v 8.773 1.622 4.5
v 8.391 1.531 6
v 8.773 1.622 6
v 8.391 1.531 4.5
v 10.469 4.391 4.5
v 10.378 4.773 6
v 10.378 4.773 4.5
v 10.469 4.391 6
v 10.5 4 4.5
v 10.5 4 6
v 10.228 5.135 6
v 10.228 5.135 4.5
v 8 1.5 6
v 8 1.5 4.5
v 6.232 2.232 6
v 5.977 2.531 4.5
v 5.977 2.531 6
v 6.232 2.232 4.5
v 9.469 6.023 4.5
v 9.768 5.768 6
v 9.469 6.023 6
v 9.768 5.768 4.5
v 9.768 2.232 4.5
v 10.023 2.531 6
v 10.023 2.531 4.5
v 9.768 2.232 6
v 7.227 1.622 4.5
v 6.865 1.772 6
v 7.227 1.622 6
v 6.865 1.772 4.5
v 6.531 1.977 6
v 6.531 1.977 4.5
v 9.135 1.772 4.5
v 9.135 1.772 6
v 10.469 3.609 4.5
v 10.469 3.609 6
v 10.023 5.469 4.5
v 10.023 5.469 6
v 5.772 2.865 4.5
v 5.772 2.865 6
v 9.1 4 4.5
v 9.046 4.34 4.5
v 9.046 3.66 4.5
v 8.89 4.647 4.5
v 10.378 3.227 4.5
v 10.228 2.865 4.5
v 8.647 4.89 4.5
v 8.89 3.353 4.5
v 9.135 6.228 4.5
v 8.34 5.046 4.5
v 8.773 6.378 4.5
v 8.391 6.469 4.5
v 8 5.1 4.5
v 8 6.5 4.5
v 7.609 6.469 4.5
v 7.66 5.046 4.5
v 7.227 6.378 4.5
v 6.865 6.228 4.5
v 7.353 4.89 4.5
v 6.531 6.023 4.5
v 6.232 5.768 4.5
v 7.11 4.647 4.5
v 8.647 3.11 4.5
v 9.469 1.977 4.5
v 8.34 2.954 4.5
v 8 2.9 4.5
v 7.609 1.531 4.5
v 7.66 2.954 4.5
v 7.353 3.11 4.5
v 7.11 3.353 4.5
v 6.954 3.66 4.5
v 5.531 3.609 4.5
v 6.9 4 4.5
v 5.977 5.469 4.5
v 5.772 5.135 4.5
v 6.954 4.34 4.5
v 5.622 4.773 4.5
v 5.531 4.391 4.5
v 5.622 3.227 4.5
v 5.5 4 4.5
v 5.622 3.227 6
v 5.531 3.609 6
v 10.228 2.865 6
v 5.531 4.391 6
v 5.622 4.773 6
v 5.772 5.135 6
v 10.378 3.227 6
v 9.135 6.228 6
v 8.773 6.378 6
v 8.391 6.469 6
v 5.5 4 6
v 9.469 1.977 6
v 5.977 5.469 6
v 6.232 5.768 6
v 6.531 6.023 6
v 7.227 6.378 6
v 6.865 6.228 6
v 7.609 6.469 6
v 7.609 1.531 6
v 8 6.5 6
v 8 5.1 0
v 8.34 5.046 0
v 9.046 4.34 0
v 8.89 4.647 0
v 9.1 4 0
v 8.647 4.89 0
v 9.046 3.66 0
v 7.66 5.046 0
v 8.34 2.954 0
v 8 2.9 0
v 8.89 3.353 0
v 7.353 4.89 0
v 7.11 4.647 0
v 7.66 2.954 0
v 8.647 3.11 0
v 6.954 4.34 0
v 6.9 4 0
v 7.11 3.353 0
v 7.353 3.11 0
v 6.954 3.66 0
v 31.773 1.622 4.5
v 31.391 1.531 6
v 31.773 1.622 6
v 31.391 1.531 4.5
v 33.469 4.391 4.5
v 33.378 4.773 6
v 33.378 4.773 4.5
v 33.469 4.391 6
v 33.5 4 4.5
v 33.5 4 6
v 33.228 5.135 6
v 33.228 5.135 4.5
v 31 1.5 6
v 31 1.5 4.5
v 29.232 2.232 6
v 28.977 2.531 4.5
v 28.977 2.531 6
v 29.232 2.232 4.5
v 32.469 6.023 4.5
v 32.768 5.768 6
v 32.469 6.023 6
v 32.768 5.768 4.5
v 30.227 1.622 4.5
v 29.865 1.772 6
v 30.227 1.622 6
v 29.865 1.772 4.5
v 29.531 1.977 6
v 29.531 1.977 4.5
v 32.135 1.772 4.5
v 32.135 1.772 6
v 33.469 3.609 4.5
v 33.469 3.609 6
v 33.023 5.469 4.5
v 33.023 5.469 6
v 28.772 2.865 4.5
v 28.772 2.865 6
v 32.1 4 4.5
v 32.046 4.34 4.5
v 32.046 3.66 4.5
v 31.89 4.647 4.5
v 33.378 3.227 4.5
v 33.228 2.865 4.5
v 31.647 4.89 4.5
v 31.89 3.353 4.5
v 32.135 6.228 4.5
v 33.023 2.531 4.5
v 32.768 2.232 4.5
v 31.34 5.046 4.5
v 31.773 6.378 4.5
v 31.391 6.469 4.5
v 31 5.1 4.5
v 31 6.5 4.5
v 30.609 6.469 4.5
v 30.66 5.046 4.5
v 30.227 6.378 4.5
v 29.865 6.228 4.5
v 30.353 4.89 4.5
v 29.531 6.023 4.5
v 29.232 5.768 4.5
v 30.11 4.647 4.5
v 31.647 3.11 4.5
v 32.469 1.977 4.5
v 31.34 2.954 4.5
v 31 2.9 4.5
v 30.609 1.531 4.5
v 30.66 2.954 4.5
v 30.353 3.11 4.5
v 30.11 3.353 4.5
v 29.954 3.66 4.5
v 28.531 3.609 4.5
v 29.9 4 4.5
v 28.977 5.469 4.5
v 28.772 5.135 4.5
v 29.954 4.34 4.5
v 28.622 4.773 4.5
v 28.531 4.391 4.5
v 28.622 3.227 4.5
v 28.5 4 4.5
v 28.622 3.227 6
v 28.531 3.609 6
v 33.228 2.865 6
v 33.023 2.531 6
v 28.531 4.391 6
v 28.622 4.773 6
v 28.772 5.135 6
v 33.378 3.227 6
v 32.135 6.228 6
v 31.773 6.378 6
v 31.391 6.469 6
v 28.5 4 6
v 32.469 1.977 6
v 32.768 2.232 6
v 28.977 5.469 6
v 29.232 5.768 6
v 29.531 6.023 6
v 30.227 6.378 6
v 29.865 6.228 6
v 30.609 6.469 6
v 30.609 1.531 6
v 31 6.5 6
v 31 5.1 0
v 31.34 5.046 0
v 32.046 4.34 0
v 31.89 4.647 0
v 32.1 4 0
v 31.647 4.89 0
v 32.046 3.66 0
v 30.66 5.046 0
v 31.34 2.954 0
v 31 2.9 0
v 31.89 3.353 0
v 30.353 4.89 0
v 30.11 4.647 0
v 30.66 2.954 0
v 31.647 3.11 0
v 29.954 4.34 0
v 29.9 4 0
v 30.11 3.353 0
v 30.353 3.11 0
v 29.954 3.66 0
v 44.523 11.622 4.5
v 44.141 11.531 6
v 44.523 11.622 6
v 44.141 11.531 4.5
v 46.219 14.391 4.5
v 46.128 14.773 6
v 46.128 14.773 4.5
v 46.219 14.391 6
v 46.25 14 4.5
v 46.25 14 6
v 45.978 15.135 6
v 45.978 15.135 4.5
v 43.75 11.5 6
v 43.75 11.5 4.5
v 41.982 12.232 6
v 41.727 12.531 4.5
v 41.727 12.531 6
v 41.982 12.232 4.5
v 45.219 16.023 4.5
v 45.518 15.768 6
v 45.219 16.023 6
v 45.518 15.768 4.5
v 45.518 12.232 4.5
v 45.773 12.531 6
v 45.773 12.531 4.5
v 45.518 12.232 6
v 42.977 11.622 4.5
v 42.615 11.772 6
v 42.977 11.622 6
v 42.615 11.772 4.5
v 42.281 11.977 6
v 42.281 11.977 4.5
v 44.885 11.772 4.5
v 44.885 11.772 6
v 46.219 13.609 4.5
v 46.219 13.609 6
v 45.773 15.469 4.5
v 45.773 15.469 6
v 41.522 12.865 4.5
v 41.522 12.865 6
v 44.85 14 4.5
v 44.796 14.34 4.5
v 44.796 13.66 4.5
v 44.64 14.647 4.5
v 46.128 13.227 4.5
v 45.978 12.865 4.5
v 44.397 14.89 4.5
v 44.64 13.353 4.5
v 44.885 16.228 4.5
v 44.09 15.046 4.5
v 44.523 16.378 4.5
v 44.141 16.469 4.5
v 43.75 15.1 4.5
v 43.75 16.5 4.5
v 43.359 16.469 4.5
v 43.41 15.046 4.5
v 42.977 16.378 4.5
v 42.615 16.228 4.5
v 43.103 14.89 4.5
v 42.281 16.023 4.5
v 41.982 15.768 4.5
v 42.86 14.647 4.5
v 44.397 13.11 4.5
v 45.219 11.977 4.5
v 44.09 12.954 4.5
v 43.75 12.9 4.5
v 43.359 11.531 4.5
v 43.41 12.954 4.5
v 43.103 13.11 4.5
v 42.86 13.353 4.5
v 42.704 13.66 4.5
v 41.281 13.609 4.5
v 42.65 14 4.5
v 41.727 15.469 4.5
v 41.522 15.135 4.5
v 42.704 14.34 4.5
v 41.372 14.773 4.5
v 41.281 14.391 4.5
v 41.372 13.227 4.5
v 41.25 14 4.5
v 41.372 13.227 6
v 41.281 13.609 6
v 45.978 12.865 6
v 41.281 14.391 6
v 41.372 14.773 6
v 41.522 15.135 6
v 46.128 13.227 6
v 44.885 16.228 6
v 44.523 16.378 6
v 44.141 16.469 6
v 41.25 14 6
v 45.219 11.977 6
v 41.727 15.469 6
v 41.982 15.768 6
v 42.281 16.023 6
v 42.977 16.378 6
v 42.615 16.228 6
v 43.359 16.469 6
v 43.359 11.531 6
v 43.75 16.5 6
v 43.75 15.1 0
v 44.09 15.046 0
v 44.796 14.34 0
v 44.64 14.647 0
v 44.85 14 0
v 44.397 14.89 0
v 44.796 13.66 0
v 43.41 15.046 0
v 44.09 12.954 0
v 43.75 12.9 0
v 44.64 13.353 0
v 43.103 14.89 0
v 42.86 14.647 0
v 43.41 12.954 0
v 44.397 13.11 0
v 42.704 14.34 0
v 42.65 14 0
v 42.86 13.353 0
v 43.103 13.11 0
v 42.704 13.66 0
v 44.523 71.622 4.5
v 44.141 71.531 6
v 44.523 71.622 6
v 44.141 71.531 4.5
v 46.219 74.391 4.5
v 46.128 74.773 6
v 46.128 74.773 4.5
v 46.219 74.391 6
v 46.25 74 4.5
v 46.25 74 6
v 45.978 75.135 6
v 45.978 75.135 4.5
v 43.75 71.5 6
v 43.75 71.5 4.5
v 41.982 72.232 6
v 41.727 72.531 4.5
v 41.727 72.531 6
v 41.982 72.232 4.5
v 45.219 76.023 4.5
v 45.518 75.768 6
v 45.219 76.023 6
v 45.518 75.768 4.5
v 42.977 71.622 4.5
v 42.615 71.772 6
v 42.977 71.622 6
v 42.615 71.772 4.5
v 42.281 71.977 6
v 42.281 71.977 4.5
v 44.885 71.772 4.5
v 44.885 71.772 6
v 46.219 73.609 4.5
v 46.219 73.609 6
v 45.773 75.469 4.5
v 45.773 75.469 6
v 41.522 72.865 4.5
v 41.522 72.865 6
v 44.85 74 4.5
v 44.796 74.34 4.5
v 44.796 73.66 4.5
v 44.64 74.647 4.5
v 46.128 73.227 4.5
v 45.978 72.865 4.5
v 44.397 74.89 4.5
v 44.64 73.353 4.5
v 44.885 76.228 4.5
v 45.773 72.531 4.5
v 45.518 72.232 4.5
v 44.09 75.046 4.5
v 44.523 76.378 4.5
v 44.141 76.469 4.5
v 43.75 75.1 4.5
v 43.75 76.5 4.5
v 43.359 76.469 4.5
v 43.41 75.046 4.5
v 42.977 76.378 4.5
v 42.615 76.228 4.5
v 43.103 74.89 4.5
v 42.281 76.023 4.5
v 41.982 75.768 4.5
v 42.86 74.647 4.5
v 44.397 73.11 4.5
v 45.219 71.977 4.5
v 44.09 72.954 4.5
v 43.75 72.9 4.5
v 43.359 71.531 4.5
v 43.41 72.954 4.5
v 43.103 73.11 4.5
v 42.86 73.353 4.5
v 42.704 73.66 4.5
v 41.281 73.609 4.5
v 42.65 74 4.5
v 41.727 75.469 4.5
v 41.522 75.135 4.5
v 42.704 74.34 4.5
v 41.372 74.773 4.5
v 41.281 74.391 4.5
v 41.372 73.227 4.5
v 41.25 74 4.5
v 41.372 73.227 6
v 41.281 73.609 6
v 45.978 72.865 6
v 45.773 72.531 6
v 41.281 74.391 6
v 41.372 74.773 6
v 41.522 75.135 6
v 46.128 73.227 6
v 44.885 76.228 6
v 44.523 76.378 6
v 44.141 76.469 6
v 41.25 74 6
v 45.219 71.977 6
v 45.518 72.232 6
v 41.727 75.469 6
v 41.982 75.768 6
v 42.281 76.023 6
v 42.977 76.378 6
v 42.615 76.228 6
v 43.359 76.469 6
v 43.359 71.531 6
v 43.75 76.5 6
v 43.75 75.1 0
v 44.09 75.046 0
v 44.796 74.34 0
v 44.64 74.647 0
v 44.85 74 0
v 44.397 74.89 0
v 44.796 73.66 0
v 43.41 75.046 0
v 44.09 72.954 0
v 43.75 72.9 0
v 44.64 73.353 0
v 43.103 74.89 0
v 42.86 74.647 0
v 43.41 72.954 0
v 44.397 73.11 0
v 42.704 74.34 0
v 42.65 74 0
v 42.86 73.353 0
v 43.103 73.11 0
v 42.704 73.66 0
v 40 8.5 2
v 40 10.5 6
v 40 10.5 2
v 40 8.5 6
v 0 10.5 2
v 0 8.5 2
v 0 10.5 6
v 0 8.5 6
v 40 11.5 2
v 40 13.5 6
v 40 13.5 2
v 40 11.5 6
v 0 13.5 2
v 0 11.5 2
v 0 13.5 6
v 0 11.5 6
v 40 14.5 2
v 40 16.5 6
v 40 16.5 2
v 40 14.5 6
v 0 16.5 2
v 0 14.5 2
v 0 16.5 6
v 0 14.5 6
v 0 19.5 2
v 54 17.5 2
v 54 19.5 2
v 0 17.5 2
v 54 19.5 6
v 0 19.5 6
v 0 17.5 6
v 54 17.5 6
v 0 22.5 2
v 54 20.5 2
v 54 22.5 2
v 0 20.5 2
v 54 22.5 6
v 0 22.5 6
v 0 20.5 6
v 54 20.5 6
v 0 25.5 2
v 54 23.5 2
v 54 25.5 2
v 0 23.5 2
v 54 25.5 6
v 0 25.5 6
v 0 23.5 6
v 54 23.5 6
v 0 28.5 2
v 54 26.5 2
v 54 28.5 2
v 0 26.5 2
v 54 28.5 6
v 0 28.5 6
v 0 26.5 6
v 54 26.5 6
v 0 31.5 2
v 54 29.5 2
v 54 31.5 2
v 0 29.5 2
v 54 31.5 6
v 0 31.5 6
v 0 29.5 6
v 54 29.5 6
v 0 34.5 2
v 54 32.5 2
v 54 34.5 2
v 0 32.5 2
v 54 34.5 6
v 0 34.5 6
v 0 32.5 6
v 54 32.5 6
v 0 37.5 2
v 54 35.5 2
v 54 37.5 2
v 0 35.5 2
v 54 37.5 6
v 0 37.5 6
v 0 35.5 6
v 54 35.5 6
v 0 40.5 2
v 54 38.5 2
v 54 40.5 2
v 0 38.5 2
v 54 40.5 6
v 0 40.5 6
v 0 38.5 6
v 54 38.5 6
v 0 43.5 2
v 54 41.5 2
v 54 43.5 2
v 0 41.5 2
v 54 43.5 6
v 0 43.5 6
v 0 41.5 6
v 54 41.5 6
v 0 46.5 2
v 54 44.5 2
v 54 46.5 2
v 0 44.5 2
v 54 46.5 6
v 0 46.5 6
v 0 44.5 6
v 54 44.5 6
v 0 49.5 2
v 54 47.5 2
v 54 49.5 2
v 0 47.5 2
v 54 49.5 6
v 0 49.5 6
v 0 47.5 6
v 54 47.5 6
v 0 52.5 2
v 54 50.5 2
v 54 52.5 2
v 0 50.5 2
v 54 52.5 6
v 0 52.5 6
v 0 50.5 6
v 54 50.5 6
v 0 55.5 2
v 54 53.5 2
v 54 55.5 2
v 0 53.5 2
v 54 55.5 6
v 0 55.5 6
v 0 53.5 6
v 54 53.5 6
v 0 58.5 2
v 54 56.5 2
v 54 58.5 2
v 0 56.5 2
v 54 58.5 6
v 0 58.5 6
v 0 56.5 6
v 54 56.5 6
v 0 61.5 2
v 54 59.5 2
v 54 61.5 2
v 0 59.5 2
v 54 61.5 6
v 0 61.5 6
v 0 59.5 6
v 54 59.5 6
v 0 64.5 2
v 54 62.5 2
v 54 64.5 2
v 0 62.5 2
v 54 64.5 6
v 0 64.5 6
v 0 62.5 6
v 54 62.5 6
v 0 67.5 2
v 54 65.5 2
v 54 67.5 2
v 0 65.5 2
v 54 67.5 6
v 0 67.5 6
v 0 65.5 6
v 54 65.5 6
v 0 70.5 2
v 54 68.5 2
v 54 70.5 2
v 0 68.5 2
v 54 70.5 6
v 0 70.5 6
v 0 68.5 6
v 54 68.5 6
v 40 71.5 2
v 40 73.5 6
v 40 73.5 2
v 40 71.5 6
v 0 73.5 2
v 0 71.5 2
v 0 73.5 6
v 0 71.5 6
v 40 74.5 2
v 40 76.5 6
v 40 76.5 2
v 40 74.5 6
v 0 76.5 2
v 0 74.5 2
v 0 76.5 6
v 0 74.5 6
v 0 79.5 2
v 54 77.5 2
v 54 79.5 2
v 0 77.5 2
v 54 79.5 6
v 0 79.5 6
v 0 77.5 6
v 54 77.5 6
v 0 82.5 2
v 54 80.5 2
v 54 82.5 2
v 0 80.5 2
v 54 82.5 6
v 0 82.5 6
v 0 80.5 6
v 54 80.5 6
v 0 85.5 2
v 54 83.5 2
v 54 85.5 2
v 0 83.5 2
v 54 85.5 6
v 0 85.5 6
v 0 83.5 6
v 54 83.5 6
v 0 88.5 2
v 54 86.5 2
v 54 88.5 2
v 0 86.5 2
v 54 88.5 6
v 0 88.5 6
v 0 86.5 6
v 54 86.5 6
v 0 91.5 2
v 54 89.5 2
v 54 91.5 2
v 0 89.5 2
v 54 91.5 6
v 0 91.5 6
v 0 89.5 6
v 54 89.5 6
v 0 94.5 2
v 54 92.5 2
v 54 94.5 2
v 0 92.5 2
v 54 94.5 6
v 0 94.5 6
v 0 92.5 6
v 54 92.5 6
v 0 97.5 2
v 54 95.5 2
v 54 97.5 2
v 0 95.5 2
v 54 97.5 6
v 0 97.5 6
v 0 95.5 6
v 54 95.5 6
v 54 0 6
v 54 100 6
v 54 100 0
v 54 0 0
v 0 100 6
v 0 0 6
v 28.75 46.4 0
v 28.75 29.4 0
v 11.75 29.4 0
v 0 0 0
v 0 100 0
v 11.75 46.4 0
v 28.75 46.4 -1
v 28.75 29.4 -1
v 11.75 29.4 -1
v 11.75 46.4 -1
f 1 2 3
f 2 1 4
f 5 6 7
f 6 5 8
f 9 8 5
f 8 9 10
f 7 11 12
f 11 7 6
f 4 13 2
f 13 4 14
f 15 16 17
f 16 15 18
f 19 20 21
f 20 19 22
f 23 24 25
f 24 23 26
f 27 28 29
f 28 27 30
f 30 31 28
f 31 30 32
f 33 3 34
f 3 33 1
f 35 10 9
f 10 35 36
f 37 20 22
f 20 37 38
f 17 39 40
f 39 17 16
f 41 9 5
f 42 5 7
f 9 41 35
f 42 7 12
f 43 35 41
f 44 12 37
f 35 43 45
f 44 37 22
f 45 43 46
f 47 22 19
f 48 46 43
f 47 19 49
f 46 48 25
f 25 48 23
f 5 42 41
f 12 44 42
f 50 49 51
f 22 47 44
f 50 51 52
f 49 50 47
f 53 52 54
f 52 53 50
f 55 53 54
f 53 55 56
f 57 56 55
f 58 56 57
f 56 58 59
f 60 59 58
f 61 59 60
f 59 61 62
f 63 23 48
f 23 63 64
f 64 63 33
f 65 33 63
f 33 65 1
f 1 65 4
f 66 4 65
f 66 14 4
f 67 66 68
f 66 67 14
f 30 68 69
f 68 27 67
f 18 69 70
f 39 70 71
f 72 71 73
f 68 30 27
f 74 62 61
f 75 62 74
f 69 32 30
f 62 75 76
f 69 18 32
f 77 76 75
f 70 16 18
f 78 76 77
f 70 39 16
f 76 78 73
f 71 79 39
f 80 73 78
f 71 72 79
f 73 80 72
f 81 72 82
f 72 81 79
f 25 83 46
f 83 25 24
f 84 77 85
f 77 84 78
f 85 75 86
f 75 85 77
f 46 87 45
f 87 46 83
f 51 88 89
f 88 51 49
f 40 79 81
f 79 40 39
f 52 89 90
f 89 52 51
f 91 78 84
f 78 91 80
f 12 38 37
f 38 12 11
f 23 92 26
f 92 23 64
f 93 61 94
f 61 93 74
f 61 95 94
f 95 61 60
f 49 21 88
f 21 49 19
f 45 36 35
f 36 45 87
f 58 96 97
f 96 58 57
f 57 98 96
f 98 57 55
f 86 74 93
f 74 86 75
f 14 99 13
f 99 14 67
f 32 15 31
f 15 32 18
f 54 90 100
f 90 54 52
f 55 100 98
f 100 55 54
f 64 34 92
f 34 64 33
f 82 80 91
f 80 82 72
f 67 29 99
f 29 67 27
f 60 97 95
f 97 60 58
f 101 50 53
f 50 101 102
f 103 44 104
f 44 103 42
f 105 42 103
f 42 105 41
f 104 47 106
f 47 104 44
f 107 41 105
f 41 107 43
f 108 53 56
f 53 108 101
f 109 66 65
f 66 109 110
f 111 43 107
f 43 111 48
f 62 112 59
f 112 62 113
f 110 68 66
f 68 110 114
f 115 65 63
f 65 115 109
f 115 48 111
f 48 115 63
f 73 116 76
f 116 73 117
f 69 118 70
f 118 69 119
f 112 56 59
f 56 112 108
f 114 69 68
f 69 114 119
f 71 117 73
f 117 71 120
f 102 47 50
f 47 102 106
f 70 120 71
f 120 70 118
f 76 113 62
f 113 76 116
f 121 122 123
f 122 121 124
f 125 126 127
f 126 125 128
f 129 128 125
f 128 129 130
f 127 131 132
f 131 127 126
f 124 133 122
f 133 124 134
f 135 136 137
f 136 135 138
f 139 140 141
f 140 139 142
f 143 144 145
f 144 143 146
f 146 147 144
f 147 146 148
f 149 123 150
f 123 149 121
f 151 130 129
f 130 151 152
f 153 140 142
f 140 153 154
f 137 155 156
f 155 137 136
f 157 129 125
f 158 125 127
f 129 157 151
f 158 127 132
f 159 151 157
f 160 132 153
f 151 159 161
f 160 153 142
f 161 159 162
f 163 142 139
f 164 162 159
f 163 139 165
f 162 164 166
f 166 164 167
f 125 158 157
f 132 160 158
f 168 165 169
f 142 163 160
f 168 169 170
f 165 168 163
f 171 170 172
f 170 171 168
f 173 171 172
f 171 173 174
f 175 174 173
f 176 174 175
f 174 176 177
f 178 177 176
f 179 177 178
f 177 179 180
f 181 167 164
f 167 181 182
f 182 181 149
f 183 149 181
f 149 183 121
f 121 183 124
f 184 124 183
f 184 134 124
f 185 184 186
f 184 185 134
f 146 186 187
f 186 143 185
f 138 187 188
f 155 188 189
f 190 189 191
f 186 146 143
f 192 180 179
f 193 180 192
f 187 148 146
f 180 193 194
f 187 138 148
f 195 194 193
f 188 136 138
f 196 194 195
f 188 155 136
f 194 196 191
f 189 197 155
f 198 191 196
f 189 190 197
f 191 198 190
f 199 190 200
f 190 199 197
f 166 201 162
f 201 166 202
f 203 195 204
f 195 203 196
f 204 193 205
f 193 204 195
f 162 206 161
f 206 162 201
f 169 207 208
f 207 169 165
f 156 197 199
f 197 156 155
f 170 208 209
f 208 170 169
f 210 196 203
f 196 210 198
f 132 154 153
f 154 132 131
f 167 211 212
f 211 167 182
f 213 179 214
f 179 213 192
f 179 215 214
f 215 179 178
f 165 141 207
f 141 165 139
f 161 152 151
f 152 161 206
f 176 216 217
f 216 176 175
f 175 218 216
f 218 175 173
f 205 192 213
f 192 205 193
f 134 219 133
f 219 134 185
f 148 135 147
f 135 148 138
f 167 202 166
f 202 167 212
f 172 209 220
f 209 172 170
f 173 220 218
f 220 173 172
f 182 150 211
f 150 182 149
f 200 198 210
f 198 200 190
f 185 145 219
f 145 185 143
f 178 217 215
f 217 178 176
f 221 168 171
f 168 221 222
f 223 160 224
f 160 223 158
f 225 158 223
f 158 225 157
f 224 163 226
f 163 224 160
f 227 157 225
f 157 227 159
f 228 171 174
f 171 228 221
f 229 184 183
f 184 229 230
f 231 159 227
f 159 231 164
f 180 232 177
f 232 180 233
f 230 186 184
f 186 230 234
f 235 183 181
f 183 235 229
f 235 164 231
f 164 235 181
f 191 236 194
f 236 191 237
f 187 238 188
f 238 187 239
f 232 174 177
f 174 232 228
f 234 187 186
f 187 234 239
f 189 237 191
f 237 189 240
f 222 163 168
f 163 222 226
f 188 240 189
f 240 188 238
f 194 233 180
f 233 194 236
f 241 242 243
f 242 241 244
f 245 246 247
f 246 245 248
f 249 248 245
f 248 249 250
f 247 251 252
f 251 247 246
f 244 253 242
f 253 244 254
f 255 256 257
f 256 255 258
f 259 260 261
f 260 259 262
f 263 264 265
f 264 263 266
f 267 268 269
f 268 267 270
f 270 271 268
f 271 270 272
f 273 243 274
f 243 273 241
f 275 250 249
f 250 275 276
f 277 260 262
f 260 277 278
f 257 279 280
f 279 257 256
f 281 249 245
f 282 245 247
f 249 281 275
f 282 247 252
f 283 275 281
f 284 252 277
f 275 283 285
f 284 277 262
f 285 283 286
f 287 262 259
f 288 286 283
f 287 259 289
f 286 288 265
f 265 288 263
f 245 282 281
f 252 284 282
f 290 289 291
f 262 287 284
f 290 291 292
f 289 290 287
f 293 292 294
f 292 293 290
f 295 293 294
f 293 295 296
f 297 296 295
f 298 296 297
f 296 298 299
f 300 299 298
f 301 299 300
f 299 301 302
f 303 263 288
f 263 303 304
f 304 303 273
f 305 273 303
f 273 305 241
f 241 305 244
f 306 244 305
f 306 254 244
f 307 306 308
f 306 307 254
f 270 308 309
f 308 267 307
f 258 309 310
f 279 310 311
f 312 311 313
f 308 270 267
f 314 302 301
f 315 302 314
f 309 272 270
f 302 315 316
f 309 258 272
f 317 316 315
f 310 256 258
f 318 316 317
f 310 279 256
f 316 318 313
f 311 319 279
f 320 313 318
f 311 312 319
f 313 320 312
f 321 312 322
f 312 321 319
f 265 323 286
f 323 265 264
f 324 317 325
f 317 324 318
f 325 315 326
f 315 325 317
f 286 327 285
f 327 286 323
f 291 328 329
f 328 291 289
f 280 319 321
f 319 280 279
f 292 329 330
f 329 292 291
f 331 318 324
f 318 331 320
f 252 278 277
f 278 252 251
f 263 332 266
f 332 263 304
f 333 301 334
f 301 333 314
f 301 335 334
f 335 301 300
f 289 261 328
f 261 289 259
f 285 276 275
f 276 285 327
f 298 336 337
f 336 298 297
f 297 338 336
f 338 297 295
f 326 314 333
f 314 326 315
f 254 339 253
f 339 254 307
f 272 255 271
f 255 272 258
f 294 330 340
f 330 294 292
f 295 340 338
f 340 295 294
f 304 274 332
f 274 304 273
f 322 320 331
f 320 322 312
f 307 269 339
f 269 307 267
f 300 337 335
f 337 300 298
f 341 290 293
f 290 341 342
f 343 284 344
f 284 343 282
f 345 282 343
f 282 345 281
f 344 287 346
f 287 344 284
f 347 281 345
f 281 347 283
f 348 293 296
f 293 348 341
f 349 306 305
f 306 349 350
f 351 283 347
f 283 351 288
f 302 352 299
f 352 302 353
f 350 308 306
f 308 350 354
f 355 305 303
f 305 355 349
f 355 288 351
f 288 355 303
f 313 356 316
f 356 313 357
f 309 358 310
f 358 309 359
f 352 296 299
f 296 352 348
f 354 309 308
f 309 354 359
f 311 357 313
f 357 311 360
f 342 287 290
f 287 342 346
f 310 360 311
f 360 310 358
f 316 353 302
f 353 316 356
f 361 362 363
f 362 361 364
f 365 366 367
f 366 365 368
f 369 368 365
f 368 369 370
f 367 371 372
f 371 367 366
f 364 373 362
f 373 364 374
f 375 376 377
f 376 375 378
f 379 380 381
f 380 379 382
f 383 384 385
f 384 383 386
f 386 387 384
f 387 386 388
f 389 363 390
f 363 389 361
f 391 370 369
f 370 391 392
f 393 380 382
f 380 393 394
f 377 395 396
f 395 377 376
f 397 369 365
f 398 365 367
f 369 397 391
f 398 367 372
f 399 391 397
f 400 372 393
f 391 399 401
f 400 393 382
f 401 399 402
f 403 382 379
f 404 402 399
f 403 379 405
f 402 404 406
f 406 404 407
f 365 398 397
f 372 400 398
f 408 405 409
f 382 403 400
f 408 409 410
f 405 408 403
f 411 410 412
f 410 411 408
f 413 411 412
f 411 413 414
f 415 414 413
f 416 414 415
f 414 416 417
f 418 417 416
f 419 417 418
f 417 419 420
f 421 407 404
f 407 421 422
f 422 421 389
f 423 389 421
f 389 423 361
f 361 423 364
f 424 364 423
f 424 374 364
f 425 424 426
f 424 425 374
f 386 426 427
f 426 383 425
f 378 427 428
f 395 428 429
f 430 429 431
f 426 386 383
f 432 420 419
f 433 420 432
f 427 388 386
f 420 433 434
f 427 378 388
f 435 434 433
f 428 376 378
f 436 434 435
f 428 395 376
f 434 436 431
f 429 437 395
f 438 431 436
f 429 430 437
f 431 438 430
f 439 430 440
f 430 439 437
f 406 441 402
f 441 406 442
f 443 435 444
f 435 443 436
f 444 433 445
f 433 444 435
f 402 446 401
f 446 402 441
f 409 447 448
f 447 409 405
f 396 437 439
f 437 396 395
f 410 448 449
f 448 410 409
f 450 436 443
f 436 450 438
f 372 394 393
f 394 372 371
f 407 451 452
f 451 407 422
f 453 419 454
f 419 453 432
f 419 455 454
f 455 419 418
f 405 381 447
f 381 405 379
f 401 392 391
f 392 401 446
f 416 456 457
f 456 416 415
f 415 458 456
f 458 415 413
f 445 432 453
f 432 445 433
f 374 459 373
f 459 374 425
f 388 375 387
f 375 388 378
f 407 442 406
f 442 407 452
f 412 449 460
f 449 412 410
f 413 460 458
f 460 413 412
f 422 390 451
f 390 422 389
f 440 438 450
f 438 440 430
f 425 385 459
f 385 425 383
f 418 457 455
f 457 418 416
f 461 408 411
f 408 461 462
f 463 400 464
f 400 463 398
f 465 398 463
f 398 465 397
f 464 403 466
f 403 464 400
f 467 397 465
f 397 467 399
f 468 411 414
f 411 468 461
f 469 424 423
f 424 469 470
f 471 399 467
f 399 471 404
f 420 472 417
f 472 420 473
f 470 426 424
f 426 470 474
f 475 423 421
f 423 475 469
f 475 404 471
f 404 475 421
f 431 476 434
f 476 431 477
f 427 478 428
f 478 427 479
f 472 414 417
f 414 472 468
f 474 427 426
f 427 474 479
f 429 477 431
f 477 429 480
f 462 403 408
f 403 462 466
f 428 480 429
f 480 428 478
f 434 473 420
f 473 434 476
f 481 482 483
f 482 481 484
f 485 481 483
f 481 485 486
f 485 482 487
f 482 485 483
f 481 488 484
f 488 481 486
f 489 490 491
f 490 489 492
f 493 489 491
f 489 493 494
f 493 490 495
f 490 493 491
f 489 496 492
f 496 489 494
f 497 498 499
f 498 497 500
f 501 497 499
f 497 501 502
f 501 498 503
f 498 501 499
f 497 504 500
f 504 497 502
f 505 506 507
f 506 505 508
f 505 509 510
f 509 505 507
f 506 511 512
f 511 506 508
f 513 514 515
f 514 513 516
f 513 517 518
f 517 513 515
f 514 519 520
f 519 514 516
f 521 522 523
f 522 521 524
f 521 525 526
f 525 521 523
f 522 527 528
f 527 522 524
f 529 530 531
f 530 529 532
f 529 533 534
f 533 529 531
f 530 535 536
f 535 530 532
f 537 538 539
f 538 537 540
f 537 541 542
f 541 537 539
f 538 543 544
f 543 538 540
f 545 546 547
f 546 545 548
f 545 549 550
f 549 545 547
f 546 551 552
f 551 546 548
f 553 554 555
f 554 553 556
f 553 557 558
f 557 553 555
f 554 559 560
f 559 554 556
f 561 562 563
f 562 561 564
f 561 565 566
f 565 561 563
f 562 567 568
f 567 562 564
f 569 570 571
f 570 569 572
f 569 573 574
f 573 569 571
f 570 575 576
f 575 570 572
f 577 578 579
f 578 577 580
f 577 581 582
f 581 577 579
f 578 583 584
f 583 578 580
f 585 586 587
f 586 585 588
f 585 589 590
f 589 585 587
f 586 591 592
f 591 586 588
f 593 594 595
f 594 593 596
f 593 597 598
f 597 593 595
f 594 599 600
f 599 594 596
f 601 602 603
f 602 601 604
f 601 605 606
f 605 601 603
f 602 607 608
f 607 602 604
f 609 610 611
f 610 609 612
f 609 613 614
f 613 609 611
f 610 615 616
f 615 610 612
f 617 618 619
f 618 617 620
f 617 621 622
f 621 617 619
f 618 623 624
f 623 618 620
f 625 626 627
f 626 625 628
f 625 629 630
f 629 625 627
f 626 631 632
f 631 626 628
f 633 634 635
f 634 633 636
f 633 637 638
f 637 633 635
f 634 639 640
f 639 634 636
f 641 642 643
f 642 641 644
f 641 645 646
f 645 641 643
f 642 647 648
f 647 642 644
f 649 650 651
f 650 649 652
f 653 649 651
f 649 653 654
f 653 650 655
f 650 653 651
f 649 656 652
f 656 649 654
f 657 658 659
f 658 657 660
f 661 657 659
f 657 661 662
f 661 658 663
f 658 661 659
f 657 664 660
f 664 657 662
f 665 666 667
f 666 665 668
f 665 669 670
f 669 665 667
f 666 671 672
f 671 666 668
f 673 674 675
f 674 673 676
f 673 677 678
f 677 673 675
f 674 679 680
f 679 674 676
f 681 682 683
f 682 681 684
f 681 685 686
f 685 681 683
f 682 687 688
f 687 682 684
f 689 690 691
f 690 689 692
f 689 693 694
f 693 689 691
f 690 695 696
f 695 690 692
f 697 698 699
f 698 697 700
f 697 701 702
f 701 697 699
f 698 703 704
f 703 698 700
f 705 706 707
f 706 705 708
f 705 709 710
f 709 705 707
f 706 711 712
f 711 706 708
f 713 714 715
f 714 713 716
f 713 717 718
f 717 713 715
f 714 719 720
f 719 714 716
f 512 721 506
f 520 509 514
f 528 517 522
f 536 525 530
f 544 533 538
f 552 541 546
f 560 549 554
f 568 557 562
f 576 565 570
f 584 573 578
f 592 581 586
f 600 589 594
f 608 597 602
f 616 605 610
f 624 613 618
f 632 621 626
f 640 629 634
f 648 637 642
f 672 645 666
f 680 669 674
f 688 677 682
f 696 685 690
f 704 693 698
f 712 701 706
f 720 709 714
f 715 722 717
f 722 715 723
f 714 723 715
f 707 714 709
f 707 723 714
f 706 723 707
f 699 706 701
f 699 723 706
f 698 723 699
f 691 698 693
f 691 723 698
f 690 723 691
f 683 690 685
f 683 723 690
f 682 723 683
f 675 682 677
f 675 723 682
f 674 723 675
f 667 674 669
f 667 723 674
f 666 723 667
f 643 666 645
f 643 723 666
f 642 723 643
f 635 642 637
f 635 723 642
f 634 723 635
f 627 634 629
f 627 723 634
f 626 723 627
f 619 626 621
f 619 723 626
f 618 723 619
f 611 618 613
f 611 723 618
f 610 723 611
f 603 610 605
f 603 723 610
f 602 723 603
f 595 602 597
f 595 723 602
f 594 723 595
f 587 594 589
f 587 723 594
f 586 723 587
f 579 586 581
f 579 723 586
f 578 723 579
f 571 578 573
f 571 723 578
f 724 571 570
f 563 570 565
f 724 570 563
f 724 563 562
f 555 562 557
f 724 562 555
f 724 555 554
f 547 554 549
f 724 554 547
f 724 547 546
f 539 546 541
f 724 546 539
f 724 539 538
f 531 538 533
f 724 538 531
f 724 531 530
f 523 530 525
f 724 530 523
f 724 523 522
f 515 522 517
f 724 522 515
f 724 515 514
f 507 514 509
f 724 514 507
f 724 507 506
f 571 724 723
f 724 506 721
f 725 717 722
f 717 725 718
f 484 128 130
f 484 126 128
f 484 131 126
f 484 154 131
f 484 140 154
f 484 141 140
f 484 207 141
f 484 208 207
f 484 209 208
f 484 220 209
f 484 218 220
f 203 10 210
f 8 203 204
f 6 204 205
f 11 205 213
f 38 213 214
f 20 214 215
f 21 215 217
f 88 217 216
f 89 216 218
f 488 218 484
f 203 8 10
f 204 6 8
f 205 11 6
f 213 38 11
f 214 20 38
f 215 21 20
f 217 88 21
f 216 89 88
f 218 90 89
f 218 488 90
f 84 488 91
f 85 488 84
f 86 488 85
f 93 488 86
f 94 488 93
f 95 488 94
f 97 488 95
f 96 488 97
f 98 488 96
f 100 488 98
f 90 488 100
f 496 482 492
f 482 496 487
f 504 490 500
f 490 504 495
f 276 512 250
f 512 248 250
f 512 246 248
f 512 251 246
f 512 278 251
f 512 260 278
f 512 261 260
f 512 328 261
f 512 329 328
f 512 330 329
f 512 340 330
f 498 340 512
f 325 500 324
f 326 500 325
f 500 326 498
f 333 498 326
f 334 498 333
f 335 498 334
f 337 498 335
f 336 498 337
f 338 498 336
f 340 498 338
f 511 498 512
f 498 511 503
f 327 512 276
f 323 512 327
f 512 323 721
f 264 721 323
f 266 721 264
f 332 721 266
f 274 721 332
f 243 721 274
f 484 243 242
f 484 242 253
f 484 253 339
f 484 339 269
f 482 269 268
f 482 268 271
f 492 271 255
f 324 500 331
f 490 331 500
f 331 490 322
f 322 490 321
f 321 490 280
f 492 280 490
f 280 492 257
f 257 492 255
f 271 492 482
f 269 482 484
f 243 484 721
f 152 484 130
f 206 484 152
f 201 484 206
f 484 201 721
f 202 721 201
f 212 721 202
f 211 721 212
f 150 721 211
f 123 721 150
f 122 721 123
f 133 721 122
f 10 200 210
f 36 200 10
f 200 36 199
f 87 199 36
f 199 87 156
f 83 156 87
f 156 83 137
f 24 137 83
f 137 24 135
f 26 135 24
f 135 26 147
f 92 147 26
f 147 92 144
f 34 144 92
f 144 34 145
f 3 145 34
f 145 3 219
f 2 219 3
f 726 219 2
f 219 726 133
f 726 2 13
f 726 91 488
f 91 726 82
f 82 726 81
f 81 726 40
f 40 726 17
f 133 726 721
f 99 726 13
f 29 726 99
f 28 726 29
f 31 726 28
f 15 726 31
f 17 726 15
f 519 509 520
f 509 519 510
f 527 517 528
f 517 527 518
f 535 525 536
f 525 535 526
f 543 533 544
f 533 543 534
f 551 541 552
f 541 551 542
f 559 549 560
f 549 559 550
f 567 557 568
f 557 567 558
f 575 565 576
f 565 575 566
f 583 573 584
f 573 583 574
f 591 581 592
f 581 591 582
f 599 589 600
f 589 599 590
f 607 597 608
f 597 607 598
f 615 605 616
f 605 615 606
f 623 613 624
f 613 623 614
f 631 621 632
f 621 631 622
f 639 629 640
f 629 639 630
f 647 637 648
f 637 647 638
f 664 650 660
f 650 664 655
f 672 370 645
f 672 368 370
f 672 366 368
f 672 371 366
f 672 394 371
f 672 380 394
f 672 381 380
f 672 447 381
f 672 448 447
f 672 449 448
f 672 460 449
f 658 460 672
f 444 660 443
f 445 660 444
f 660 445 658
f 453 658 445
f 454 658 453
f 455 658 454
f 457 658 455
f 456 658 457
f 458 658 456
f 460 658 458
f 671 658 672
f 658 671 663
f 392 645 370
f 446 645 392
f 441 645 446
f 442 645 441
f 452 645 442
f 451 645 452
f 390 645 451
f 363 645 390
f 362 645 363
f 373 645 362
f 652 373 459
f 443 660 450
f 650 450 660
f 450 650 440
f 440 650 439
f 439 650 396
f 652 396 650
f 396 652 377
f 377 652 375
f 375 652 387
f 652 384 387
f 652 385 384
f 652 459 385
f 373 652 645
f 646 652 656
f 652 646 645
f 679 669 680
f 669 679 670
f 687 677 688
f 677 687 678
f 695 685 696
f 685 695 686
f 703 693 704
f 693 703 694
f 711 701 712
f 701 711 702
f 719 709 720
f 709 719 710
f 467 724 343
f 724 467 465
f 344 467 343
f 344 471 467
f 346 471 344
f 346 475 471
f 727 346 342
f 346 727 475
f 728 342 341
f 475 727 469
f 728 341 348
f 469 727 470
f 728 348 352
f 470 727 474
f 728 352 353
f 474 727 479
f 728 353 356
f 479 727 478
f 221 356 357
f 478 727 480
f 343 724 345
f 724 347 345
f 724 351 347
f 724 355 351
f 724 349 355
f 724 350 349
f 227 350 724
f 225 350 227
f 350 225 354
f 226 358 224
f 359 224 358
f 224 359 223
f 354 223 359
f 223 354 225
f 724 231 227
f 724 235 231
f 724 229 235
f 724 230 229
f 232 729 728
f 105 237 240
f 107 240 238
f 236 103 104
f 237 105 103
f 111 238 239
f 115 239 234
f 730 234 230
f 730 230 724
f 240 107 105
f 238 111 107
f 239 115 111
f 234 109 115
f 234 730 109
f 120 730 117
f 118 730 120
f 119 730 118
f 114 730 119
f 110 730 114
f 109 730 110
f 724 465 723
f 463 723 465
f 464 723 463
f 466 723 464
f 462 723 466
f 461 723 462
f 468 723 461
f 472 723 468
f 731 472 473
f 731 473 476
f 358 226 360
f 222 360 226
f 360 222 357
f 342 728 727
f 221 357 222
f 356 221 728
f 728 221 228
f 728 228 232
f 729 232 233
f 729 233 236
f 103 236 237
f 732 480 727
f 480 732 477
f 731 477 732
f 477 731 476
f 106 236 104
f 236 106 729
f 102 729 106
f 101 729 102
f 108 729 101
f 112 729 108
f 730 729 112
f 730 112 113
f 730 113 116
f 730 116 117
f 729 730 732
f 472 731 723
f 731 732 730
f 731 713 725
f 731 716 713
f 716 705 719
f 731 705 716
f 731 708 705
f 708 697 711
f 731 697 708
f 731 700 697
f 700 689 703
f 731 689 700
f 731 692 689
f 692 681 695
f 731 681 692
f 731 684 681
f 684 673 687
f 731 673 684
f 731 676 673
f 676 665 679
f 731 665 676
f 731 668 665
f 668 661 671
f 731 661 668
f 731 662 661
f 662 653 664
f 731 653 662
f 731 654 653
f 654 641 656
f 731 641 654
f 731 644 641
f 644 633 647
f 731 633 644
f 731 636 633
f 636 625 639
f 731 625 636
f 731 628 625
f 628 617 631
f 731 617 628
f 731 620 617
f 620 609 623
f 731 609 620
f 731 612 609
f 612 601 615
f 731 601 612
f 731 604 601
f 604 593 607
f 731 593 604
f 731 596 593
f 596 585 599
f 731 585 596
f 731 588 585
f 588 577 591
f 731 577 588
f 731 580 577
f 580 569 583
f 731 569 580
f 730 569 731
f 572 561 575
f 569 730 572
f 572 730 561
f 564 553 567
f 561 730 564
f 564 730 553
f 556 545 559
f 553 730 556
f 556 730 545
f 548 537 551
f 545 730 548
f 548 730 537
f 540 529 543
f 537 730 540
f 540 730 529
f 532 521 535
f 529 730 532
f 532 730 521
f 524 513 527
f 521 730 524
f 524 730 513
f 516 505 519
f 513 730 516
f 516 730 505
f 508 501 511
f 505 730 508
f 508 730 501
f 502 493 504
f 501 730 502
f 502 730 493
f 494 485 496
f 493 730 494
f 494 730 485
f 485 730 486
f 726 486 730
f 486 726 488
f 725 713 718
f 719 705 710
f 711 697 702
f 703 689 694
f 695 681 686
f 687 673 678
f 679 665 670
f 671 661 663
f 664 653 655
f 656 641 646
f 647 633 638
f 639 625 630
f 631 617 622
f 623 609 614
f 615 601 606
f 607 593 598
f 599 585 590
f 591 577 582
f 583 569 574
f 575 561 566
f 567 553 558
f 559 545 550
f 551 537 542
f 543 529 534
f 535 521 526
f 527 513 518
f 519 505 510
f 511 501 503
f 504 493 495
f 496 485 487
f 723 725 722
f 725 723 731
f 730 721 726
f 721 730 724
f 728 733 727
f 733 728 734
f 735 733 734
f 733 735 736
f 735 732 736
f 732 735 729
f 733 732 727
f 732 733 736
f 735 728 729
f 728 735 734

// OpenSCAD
x1 = 8;
y1 = 4;

x2 = x1+23;
y2 = y1+10;

x3 = x2+12.75;
y3 = y2+60;

sink_width = 54;
sink_height = 6;
sink_depth = 25+y3+1;

fins_y = 20.5;
fin_width = sink_width+2;
fin_thickness = 2;
fin_spacing = 3;
fin_depth = sink_height-2;

module screw_hole(x,y,height) {
  shh=3;
  translate([x,y,height])   cylinder(h=shh, r=5/2, center = true, $fn=40);
  translate([x,y,height/2]) cylinder(h=height+1, r=2.2/2, center = true, $fn=20);
}

union() {
difference() {
  cube([sink_width,sink_depth,sink_height]);
  
  screw_hole(x1,y1,sink_height);
  screw_hole(x2,y1,sink_height);
  screw_hole(x3,y2,sink_height);
  screw_hole(x3,y3,sink_height);
  
  for (i = [-4 : -2]) {
    translate([-1,fins_y+i*fin_spacing,sink_height-fin_depth]) cube([fin_width-15,fin_thickness,fin_depth+1]);
  }
  
  for (i = [-1 : 16]) {
    translate([-1,fins_y+i*fin_spacing,sink_height-fin_depth]) cube([fin_width,fin_thickness,fin_depth+1]);
  }
  
  for (i = [17 : 18]) {
    translate([-1,fins_y+i*fin_spacing,sink_height-fin_depth]) cube([fin_width-15,fin_thickness,fin_depth+1]);
  }
  
  for (i = [19 : 25]) {
    translate([-1,fins_y+i*fin_spacing,sink_height-fin_depth]) cube([fin_width,fin_thickness,fin_depth+1]);
  }
  
  //translate([42.5,1.5,6.5]) linear_extrude(height = 2, center = true, convexity = 10) scale(0.12) import(file = "mnt.svg");
}

// cpu contact pad
translate([x3-17-15,y2+18.6-3.2,-1]) color([1,0,0]) cube([17,17,1]);
}
